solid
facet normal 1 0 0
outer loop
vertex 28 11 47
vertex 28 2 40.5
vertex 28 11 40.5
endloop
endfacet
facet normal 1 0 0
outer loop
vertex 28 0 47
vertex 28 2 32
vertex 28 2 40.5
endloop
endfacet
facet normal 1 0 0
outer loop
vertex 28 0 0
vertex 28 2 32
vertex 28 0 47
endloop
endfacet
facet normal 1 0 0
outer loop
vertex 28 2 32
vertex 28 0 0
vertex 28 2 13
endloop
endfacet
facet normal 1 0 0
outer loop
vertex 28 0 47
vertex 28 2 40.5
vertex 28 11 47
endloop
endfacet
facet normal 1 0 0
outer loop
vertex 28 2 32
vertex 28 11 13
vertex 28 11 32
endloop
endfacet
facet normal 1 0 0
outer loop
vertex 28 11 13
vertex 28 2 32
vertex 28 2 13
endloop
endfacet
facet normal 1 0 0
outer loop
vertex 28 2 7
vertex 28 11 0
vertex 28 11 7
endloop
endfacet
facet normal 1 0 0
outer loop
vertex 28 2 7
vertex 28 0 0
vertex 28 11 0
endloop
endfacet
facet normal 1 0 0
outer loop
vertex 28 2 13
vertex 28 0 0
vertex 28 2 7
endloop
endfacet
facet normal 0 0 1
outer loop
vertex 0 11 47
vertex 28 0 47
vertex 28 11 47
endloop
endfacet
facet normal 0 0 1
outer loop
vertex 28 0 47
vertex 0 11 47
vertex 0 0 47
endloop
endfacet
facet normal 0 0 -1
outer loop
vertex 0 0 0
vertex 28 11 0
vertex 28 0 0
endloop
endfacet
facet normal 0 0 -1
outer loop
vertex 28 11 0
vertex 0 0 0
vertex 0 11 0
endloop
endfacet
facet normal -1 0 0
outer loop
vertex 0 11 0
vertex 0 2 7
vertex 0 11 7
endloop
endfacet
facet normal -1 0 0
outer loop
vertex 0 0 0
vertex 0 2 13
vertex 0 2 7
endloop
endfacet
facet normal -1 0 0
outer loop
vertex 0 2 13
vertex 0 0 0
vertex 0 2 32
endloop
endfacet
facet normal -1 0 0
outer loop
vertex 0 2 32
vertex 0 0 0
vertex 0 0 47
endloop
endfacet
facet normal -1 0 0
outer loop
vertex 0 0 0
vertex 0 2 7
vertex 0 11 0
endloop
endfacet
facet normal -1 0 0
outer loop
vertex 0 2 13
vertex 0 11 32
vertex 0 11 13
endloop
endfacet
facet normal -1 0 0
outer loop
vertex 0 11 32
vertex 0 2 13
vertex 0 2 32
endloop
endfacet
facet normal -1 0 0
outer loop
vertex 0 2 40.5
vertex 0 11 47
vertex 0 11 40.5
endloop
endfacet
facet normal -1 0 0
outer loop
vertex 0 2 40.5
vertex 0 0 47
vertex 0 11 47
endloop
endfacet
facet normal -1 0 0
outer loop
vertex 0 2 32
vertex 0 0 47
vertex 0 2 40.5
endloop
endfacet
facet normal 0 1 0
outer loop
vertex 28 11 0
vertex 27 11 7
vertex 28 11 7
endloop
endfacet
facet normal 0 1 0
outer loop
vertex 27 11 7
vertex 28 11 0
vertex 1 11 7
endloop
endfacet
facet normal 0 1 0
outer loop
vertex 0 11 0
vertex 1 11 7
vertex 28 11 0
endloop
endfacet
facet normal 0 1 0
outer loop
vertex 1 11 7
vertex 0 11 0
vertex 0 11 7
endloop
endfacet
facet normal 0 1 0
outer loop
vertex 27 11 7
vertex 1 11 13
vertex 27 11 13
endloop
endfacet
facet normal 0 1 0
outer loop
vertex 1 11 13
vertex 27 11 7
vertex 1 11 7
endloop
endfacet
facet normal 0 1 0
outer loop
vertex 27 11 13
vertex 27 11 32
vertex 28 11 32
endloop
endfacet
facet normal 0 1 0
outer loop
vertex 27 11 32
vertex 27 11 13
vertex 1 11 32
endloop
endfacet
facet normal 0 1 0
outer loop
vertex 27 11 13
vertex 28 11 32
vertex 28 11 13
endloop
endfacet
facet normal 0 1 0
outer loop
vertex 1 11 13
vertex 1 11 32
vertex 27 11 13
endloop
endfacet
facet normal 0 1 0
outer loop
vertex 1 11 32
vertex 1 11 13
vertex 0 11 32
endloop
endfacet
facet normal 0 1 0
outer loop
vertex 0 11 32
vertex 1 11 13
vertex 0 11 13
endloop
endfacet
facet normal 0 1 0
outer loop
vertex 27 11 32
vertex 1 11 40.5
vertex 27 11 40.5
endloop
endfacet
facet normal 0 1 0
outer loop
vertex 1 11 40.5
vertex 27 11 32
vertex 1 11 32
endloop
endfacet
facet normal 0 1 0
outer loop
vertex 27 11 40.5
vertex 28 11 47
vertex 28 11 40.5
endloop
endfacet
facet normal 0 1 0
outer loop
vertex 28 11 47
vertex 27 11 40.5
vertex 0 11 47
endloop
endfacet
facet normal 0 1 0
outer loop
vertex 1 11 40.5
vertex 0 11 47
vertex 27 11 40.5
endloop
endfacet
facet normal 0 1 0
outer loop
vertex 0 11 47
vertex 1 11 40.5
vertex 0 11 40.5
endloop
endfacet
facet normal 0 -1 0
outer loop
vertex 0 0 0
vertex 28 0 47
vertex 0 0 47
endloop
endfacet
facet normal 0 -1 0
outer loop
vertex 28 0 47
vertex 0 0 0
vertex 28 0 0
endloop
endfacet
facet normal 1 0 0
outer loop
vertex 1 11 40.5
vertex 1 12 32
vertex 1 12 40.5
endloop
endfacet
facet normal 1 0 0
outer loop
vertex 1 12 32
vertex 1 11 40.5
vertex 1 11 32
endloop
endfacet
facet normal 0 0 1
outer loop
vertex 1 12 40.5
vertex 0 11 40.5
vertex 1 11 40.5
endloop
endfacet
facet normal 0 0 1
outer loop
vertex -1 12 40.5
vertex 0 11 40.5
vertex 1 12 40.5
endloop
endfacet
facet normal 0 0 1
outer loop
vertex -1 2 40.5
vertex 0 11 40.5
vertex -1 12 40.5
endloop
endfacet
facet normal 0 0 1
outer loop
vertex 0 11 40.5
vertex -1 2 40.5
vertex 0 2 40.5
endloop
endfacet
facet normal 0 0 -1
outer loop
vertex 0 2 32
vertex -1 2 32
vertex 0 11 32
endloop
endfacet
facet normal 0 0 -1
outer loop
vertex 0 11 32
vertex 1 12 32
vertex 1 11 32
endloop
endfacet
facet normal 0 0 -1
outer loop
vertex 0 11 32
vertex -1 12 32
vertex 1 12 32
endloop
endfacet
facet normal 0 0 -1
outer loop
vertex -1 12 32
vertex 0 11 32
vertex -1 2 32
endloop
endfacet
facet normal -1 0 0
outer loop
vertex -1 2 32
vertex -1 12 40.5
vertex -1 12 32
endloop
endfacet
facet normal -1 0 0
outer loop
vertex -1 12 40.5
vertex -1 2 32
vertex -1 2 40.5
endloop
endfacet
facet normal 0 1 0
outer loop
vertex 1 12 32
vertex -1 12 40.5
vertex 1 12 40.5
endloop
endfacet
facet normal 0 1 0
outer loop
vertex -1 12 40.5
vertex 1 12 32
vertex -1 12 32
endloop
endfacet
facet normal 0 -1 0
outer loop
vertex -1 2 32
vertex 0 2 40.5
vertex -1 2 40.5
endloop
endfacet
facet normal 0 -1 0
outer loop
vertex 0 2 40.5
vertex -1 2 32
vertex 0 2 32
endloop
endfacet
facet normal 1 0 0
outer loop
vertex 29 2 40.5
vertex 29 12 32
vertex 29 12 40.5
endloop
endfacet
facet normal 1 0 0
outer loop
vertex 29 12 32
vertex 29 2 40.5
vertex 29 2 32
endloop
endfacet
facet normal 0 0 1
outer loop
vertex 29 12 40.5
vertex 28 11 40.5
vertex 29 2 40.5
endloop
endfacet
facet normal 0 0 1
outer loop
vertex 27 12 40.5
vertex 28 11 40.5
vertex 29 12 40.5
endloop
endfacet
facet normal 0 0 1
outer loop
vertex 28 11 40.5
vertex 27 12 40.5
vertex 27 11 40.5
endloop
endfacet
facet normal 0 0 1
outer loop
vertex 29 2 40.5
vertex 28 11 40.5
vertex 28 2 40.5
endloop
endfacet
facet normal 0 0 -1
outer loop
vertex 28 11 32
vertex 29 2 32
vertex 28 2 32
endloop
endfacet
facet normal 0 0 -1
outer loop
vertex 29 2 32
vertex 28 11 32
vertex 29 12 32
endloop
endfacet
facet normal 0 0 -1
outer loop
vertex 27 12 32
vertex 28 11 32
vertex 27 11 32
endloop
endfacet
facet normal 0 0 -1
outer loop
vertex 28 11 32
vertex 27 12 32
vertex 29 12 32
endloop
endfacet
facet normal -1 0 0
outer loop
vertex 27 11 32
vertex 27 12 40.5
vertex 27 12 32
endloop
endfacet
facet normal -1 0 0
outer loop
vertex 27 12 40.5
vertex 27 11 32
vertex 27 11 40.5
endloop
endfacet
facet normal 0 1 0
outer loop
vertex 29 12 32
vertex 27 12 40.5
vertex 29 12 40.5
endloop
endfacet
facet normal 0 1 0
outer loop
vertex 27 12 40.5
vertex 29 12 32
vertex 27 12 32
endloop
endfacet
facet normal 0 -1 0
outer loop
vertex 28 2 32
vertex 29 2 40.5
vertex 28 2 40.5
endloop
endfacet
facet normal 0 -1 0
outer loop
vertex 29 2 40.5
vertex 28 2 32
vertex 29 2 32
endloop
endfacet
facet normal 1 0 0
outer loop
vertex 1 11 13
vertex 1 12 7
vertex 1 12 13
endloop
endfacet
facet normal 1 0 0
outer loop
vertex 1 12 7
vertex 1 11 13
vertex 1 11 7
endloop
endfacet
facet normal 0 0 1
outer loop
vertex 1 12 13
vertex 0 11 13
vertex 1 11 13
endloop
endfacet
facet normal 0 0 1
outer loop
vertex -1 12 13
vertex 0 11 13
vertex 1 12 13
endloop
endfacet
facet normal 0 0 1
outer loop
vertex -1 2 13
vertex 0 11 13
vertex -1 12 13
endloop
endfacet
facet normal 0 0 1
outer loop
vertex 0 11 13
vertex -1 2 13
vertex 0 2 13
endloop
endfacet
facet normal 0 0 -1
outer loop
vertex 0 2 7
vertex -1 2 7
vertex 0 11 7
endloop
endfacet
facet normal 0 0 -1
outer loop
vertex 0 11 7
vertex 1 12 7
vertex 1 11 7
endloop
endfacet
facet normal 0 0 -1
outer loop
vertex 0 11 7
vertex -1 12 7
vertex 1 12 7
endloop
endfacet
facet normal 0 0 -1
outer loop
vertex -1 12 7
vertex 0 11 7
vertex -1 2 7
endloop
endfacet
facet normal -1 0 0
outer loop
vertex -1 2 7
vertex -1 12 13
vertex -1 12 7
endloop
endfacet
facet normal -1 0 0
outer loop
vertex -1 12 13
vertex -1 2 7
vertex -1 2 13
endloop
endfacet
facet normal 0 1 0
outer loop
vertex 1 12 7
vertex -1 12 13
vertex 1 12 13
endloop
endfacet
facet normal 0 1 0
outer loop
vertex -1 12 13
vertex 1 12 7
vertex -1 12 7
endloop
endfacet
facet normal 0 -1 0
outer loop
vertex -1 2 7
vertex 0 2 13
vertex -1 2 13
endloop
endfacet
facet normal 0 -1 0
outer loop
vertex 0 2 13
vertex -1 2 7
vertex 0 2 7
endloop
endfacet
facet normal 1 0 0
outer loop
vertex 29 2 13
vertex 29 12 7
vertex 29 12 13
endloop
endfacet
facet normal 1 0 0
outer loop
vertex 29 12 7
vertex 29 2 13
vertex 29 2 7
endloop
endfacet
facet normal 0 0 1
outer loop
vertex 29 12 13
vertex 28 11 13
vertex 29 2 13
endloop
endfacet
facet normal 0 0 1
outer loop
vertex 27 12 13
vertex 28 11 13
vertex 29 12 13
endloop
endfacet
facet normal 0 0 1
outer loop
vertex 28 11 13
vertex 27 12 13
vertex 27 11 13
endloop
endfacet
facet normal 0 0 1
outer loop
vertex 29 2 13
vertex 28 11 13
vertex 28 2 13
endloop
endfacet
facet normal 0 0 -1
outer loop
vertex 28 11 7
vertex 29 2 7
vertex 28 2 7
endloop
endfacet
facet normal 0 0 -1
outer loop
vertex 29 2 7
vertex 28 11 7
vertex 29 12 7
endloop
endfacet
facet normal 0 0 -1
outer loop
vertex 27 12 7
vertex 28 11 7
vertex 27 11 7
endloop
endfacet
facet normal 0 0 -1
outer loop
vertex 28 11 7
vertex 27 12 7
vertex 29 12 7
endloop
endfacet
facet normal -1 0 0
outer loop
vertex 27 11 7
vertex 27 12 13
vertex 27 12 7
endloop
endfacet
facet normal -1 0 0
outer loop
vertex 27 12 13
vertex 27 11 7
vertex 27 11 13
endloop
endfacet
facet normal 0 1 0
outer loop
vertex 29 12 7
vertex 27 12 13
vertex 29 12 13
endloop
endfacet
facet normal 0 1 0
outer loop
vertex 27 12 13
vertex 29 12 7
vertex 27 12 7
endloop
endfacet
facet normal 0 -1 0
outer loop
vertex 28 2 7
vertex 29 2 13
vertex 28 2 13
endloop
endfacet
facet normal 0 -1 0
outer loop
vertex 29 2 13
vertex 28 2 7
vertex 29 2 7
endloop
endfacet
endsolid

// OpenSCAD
module c14_plug() {
  union() {
    translate([0, 0, 0])
      cube([28, 11, 47], false);

    color("black")
    translate([-1, 2, 7+6+19])
      cube([2, 10, 8.5], false);

    color("black")
    translate([27, 2, 7+6+19])
      cube([2, 10, 8.5], false);

    color("black")
    translate([-1, 2, 7])
      cube([2, 10, 6], false);

    color("black")
    translate([27, 2, 7])
      cube([2, 10, 6], false);
  }
}

c14_plug();
